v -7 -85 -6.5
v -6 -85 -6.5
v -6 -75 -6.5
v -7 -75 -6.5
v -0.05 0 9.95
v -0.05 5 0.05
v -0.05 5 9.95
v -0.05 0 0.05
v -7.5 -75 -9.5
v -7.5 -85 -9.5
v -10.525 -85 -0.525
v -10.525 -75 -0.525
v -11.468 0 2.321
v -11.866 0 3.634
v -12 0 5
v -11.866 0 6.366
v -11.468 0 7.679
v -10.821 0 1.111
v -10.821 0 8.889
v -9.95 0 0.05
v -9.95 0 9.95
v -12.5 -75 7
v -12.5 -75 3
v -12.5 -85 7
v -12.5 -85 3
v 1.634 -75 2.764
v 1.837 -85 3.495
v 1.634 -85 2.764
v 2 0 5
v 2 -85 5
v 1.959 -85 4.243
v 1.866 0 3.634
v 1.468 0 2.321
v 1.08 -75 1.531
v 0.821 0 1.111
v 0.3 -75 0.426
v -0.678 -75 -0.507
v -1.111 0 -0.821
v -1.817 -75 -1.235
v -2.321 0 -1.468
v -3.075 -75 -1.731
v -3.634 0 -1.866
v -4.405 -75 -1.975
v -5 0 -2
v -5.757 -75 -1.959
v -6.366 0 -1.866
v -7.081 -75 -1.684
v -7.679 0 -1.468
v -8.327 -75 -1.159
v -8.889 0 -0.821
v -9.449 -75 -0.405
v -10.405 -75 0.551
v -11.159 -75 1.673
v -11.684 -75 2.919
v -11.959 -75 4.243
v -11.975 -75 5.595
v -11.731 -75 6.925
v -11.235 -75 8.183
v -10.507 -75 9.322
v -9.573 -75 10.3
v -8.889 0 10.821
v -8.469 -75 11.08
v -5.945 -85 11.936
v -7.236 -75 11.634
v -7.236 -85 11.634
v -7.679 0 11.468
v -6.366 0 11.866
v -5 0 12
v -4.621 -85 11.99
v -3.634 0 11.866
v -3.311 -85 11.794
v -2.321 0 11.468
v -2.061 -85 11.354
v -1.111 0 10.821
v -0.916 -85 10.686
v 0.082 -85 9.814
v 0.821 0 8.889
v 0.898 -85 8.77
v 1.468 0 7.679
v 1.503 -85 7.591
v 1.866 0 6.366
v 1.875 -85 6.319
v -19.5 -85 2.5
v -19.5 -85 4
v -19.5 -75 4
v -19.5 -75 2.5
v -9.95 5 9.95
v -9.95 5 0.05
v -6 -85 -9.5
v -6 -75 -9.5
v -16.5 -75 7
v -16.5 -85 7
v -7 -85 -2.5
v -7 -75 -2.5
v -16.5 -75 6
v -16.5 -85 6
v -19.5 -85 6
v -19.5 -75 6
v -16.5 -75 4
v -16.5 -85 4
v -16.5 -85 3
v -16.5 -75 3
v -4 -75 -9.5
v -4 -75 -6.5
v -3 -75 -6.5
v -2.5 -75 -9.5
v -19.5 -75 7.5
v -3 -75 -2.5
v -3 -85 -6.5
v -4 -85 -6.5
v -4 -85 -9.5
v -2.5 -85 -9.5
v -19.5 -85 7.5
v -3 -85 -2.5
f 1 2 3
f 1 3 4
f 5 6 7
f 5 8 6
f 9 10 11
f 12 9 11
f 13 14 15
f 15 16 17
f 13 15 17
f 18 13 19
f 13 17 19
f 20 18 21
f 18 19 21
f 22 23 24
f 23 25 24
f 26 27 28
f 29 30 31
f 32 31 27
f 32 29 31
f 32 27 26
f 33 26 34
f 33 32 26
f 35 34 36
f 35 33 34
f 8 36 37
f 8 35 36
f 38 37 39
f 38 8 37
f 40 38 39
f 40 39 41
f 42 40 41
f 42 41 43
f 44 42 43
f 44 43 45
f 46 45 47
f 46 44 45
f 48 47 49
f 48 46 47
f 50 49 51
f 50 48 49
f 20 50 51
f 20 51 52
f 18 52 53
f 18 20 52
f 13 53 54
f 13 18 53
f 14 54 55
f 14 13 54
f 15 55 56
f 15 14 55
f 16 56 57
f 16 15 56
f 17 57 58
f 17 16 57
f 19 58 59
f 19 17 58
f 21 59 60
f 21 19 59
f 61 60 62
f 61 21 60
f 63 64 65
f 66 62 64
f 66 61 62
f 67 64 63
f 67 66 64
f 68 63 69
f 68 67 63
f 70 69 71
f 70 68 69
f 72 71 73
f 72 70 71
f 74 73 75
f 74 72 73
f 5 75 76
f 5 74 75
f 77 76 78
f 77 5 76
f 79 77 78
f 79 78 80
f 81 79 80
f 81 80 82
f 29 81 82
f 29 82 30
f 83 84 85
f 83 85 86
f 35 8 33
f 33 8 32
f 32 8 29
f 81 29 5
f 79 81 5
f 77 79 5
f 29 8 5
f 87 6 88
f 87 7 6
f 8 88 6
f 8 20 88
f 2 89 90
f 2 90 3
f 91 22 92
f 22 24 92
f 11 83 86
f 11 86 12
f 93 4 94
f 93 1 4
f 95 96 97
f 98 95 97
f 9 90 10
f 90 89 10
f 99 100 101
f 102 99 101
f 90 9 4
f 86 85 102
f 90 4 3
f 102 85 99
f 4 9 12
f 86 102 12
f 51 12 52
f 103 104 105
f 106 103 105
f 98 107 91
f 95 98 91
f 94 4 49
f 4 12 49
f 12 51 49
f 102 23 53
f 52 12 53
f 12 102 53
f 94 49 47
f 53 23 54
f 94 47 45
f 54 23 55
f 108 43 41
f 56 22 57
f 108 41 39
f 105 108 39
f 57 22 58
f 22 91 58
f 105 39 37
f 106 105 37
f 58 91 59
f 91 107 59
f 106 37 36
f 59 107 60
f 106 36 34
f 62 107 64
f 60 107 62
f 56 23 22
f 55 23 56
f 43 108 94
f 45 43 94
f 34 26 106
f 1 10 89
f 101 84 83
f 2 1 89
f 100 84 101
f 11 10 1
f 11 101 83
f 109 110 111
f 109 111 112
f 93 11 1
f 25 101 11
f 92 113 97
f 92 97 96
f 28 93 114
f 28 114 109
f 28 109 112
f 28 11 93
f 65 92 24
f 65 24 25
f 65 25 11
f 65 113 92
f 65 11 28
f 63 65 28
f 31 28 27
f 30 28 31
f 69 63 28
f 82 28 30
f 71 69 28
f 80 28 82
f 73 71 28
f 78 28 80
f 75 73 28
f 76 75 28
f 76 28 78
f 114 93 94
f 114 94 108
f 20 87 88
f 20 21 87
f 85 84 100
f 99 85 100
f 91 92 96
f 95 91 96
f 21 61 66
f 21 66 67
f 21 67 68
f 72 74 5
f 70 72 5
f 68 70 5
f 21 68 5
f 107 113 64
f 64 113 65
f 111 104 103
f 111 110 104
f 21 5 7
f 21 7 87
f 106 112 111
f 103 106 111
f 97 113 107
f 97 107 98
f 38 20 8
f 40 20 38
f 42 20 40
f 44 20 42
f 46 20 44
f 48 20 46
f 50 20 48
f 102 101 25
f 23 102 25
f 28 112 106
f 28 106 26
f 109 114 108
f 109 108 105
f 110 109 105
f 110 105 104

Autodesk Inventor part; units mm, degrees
ref_plane "YZ Plane" through (0, 0, 0) normal (1, 0, 0) x (0, 1, 0)
ref_plane "XZ Plane" through (0, 0, 0) normal (0, 1, 0) x (-1, 0, 0)
ref_plane "XY Plane" through (0, 0, 0) normal (0, 0, 1) x (1, 0, 0)
sketch "Sketch1" plane through (0, 0, 0) normal (0, 1, 0) x (-1, 0, 0)
  line L0 (0, 0) -> (10, 0)
  line L1 (0, 10) -> (0, 0)
  line L2 (10, 10) -> (0, 10)
  line L3 (10, 0) -> (10, 10)
  line L4 (0, 10) -> (0.05, 10)
  line L5 (0.05, 10) -> (0.05, 9.95)
  line L6 (0.05, 9.95) -> (0, 9.95)
  line L7 (0, 9.95) -> (0, 10)
  line L8 (10, 0) -> (9.95, 0)
  line L9 (9.95, 0) -> (9.95, 0.05)
  line L10 (9.95, 0.05) -> (10, 0.05)
  line L11 (10, 0.05) -> (10, 0)
  line L12 (0.05, 9.95) -> (9.95, 9.95)
  line L13 (9.95, 9.95) -> (9.95, 0.05)
  line L14 (9.95, 0.05) -> (0.05, 0.05)
  line L15 (0.05, 0.05) -> (0.05, 9.95)
  point P0 (0, 0)
  dimension "d0" = 0.05
  dimension "d1" = 0.05
  dimension "d2" = 0.05
  dimension "d3" = 0.05
extrude "Extrusion1" add sketch "Sketch1" along normal blind 5 contours L14 L15 L12 L13
sketch "Sketch2" plane through (0, 0, 0) normal (0, -1, 0) x (1, 0, 0)
  line L0 (-0.05, 0.05) -> (-9.95, 0.05)
  line L1 (-0.05, 9.95) -> (-0.05, 0.05)
  line L2 (-9.95, 9.95) -> (-0.05, 9.95)
  line L3 (-9.95, 0.05) -> (-9.95, 9.95)
  line L4 (-0.05, 5) -> (-9.95, 5)
  circle A0 centre (-5, 5) radius 7.0004
  point P0 (0, 0)
extrude "Extrusion2" add sketch "Sketch2" along normal blind 85
sketch "Sketch4" plane through (-5, -85, 5) normal (0, -1, 0) x (1, 0, 0)
  circle A0 centre (0, 0) radius 7.0004
  circle A1 centre (0, 0) radius 7.0004 projected
  line L0 (0, -7.0004) -> (0, -12)
  line L1 (-2.5, -9.5) -> (2.5, -9.5)
  line L2 (2.5, -9.5) -> (2.5, -14.5)
  line L3 (2.5, -14.5) -> (-2.5, -14.5)
  line L4 (-2.5, -14.5) -> (-2.5, -9.5)
  line L5 (-2.5, -9.5) -> (2.5, -14.5) construction
  line L6 (2.5, -9.5) -> (-2.5, -14.5) construction
  line L7 (-7.0004, 0.0004) -> (-12.0004, 0.0004)
  line L8 (-9.5004, 2.5004) -> (-14.5004, 2.5004)
  line L9 (-14.5004, 2.5004) -> (-14.5004, -2.4996)
  line L10 (-14.5004, -2.4996) -> (-9.5004, -2.4996)
  line L11 (-9.5004, -2.4996) -> (-9.5004, 2.5004)
  line L12 (-9.5004, 2.5004) -> (-14.5004, -2.4996) construction
  line L13 (-14.5004, 2.5004) -> (-9.5004, -2.4996) construction
  line L14 (-9.5004, -2.4996) -> (-9.5004, -4.9996)
  line L15 (-14.5004, 2.5004) -> (-2.2357, 6.6338)
  line L16 (-14.5004, -2.4996) -> (-2.236, -6.6336)
  line L17 (-2.5, -14.5) -> (-6.6337, -2.2359)
  line L18 (2.5, -14.5) -> (6.6337, -2.2359)
  point P0 (5, -5)
  point P1 (-12.0004, 0.0004)
  point P2 (6.6337, -2.2359)
  point P3 (-2.2357, 6.6338)
  point P4 (-5.5251, -5.525)
  dimension "d16" = 5
  dimension "d17" = 5
  dimension "d18" = 5
  dimension "d19" = 5
  dimension "d20" = 5
  dimension "d21" = 2.5
extrude "Extrusion4" add sketch "Sketch4" against normal blind 10 contours A0 L7 L11 L8 L15 | L18 L2 L1 L0 A0 | A0 L17 L16 L14 L11 L7 | L8 L11 L10 L9 | L0 L1 L4 L17 L16 A0 | L3 L4 L1 L2 | A0 L16 L17 | L10 L14 L16
sketch "Sketch6" plane through (0, -85, 0) normal (0, -1, 0) x (1, 0, 0)
  arc A0 (1.6337, 2.7641) -> (-7.2357, 11.6338) centre (-5, 5) ccw
  line L0 (-7.2357, 11.6338) -> (-19.5004, 7.5004)
  line L1 (-19.5004, 7.5004) -> (-19.5004, 2.5004)
  line L2 (-19.5004, 2.5004) -> (-10.5251, -0.525)
  line L3 (-10.5251, -0.525) -> (-7.5, -9.5)
  line L4 (-7.5, -9.5) -> (-2.5, -9.5)
  line L5 (-2.5, -9.5) -> (1.6337, 2.7641)
  line L6 (-3, -6.5) -> (-7, -6.5)
  line L7 (-7, -6.5) -> (-7, -2.5)
  line L8 (-7, -2.5) -> (-3, -2.5)
  line L9 (-3, -2.5) -> (-3, -6.5)
  line L10 (-3, -6.5) -> (-7, -2.5) construction
  line L11 (-7, -6.5) -> (-3, -2.5) construction
  line L12 (-4, -9.5) -> (-6, -9.5)
  line L13 (-6, -9.5) -> (-6, -6.5)
  line L14 (-6, -6.5) -> (-4, -6.5)
  line L15 (-4, -6.5) -> (-4, -9.5)
  line L16 (-4, -9.5) -> (-6, -6.5) construction
  line L17 (-6, -9.5) -> (-4, -6.5) construction
  line L18 (-10.5251, -0.525) -> (-0.05, 9.95)
  line L19 (-10.5251, -0.525) -> (4.2889, -0.525) construction
  line L20 (-16.5004, 6.0004) -> (-19.5004, 6.0004)
  line L21 (-19.5004, 6.0004) -> (-19.5004, 4.0004)
  line L22 (-19.5004, 4.0004) -> (-16.5004, 4.0004)
  line L23 (-16.5004, 4.0004) -> (-16.5004, 6.0004)
  line L24 (-16.5004, 6.0004) -> (-19.5004, 4.0004) construction
  line L25 (-19.5004, 6.0004) -> (-16.5004, 4.0004) construction
  line L26 (-12.5004, 7.0004) -> (-16.5004, 7.0004)
  line L27 (-16.5004, 7.0004) -> (-16.5004, 3.0004)
  line L28 (-16.5004, 3.0004) -> (-12.5004, 3.0004)
  line L29 (-12.5004, 3.0004) -> (-12.5004, 7.0004)
  line L30 (-12.5004, 7.0004) -> (-16.5004, 3.0004) construction
  line L31 (-16.5004, 7.0004) -> (-12.5004, 3.0004) construction
  point P0 (0, 0)
  point P1 (-5, -8)
  dimension "d27" = 4
  dimension "d28" = 4
  dimension "d29" = 45
  dimension "d31" = 3
  dimension "d32" = 2
  dimension "d34" = 4
  dimension "d35" = 4
extrude "Extrusion6" cut sketch "Sketch6" against normal blind 85 contours L4 L13 L6 L15 | L6 L7 L8 L9 | L20 L23 L22 L1 | L27 L26 L29 L28 L23
properties part number "LegV2"
